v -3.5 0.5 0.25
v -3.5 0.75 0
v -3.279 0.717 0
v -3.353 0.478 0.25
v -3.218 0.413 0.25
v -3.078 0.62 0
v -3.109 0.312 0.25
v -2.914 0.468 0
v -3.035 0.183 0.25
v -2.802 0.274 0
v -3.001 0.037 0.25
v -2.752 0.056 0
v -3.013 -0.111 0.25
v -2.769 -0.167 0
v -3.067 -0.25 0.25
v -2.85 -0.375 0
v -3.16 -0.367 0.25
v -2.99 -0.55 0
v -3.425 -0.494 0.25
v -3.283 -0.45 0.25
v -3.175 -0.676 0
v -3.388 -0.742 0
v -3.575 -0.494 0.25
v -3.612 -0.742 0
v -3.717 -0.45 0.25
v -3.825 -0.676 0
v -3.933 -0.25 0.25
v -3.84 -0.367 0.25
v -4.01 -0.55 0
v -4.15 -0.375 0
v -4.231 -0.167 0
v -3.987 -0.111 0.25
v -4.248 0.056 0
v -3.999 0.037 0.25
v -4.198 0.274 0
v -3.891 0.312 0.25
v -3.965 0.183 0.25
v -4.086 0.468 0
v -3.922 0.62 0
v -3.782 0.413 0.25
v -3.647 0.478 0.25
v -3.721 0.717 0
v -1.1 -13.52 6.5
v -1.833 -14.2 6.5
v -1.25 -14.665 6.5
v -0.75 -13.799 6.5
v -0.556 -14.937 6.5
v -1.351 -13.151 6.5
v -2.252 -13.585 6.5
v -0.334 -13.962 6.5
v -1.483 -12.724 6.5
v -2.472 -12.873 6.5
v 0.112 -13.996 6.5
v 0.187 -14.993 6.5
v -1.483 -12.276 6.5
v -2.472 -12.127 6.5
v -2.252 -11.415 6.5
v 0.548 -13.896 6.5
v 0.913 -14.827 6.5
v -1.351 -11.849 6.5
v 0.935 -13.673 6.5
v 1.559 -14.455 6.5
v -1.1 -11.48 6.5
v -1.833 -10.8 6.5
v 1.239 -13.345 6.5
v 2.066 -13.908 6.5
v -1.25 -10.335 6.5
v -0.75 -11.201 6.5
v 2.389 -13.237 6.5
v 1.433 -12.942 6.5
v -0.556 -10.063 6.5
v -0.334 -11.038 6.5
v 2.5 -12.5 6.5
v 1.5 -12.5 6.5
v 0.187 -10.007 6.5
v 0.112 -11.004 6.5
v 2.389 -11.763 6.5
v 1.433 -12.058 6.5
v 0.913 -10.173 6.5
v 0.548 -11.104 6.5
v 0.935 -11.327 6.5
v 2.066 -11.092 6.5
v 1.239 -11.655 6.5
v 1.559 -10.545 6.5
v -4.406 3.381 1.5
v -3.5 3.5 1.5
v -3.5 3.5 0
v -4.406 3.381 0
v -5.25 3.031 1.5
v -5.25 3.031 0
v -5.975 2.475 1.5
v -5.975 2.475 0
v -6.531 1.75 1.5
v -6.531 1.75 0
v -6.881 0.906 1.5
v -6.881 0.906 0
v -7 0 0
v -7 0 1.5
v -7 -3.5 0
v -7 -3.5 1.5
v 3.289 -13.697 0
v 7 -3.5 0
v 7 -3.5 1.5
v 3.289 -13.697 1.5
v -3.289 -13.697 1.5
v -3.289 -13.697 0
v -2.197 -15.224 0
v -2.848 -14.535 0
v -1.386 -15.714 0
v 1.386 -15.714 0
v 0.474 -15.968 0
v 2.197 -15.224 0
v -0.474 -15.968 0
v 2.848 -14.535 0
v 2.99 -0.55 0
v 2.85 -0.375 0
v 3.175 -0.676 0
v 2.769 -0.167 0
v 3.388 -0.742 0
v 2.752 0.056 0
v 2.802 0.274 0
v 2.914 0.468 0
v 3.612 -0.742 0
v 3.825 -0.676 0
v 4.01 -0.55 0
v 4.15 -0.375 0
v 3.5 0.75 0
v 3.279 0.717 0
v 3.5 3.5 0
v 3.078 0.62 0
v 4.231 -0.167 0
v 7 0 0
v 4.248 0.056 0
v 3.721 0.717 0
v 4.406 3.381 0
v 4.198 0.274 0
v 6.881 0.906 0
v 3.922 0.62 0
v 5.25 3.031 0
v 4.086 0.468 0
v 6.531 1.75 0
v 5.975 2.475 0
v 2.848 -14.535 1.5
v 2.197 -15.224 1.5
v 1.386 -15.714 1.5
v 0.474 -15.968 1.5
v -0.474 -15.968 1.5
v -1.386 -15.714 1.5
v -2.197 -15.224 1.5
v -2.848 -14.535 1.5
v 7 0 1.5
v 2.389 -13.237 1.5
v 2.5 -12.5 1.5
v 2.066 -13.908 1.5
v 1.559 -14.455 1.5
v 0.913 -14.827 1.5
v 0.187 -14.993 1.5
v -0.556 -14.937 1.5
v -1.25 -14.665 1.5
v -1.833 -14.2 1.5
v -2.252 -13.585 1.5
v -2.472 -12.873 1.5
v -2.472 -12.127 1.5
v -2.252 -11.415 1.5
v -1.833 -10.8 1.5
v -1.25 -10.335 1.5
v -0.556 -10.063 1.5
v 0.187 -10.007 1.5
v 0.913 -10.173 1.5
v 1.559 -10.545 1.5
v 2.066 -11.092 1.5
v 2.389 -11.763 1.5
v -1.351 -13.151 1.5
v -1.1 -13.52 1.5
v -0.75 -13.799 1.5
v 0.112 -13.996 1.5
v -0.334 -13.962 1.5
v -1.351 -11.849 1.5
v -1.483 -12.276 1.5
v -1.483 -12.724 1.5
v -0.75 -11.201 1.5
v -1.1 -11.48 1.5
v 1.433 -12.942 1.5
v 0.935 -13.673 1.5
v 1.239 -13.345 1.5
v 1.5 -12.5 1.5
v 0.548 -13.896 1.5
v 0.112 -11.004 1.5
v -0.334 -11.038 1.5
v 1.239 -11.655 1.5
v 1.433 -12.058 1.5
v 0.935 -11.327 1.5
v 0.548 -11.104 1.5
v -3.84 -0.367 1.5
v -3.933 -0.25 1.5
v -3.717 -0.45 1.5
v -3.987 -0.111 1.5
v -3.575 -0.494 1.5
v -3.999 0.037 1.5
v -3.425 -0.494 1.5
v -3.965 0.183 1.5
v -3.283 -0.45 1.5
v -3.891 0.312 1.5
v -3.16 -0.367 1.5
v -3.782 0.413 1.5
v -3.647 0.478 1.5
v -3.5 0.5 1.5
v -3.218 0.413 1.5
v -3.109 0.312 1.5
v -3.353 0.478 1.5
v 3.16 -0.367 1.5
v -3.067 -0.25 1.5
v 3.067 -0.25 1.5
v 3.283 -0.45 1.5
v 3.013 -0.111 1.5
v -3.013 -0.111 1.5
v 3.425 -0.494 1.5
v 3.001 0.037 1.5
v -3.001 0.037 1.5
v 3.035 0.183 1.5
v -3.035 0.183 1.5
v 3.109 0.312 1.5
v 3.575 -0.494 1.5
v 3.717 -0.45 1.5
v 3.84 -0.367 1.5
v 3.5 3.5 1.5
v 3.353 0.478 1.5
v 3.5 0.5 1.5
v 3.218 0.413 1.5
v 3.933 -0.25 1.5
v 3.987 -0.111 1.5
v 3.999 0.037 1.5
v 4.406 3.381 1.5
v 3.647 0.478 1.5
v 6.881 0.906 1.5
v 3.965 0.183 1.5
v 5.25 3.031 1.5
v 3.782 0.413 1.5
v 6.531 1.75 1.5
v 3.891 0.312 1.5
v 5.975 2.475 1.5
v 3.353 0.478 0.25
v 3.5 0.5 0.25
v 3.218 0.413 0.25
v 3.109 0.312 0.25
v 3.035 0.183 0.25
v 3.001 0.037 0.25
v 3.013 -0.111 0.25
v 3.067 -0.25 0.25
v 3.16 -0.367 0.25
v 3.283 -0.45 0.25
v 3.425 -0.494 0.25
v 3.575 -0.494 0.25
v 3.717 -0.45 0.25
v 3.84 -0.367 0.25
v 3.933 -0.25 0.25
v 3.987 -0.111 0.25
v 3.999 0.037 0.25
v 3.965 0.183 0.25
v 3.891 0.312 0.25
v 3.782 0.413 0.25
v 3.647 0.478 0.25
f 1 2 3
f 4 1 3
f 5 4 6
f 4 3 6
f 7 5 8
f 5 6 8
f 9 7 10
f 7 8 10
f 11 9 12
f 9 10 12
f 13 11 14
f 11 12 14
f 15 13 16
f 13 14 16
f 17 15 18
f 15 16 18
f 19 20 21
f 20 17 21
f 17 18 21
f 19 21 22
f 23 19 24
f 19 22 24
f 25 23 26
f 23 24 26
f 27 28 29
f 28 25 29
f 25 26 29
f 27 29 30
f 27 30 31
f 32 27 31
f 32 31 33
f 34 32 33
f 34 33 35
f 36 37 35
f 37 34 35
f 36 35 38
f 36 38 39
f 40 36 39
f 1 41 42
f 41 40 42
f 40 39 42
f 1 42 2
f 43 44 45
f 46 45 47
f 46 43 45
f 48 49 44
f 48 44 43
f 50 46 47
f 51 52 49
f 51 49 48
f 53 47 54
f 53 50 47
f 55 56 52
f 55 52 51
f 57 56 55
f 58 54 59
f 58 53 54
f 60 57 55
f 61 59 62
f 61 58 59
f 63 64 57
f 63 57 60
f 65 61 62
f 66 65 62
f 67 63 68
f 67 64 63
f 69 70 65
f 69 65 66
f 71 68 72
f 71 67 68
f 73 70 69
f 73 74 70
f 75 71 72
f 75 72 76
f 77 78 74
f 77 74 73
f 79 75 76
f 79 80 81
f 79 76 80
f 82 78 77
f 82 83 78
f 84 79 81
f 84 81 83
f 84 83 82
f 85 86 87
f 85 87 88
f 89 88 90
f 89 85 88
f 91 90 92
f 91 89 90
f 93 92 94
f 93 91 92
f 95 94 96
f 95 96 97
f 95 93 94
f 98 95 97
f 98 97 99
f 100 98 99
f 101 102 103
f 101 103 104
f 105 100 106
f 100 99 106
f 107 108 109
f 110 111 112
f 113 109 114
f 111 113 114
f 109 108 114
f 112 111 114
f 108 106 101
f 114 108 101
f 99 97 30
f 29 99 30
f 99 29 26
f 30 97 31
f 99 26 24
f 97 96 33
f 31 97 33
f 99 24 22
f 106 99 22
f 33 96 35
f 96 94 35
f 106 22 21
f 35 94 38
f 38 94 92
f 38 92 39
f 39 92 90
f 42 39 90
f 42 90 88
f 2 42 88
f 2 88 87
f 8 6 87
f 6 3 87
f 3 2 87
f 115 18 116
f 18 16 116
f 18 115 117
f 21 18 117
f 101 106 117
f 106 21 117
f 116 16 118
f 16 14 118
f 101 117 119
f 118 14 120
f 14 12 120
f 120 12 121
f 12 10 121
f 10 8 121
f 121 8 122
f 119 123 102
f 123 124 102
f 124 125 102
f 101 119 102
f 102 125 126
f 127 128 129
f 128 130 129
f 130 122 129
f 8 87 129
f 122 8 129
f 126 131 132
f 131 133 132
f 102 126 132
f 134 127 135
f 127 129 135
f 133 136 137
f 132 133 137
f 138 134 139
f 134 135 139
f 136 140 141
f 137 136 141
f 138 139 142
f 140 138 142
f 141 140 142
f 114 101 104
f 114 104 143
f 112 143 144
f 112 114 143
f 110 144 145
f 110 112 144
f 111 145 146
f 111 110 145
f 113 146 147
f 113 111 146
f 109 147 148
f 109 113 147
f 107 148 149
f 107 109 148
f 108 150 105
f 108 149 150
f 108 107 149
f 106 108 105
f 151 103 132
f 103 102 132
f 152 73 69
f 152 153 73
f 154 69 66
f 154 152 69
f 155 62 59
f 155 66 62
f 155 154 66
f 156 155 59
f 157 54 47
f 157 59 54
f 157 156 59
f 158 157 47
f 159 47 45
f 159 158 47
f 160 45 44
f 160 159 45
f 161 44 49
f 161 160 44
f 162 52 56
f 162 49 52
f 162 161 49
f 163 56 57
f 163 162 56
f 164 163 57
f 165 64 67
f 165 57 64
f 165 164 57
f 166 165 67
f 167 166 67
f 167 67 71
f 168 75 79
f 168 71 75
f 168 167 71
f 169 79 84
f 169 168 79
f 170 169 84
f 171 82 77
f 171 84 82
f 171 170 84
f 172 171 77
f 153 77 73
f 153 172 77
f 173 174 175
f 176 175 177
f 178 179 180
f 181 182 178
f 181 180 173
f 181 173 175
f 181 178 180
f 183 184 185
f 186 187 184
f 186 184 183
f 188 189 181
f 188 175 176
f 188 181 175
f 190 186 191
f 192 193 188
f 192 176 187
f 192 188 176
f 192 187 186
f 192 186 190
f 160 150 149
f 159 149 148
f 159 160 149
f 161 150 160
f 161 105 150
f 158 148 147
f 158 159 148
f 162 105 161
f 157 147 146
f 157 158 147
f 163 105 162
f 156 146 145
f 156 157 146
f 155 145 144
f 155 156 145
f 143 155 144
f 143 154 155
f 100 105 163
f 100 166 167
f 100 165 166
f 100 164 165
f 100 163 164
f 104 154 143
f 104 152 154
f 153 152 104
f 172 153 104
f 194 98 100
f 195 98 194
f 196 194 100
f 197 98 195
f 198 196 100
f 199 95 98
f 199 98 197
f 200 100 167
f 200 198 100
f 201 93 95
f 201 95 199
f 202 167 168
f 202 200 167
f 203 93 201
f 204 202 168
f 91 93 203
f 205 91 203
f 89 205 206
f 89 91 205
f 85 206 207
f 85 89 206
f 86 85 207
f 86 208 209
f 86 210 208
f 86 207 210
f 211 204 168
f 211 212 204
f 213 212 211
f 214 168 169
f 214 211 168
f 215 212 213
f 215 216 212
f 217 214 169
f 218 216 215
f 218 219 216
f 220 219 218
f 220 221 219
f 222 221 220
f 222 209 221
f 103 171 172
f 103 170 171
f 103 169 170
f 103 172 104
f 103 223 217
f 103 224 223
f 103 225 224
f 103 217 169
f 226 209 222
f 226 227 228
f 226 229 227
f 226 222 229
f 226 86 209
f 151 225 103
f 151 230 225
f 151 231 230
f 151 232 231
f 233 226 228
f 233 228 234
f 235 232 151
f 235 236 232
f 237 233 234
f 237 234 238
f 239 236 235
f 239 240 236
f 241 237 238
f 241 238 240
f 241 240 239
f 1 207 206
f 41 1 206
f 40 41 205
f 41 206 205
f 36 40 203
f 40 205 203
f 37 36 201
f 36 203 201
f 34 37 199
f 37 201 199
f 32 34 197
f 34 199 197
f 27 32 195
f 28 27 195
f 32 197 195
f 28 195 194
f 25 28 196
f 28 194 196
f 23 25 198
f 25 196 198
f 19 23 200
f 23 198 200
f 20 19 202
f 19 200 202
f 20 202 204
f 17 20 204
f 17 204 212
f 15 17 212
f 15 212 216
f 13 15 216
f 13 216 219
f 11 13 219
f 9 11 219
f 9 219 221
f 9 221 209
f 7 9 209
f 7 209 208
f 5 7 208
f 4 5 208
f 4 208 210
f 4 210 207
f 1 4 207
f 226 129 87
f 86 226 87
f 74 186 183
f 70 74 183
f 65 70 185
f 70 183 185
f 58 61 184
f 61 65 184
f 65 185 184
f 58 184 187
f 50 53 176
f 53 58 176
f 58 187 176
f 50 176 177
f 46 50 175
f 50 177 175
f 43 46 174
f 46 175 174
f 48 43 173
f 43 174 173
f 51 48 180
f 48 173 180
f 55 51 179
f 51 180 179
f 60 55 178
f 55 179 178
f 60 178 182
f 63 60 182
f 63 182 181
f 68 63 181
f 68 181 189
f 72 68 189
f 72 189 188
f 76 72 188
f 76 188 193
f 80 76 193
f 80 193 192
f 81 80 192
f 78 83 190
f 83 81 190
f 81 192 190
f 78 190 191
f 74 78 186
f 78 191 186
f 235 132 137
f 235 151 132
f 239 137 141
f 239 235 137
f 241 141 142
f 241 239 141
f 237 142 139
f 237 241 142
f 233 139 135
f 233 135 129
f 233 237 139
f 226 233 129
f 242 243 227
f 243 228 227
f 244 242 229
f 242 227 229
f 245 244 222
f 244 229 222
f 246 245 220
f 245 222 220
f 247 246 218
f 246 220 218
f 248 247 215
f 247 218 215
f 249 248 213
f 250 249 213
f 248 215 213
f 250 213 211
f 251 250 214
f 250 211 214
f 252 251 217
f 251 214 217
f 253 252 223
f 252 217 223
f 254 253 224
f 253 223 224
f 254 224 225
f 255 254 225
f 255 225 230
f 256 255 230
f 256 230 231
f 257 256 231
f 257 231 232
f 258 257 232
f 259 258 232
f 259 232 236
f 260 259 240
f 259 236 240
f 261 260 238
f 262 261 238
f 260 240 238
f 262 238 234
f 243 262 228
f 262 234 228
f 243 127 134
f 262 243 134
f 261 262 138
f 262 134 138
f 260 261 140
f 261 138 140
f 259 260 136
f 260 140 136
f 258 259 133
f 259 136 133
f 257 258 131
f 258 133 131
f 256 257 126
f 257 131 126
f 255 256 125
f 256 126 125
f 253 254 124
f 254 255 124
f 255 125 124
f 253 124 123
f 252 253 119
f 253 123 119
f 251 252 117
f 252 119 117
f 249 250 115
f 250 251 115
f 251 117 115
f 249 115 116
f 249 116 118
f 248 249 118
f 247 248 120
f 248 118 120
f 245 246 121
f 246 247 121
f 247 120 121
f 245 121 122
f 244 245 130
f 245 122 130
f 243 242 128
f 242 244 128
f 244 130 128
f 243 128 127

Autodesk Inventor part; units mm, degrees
ref_plane "YZ Plane" through (0, 0, 0) normal (1, 0, 0) x (0, 1, 0)
ref_plane "XZ Plane" through (0, 0, 0) normal (0, 1, 0) x (-1, 0, 0)
ref_plane "XY Plane" through (0, 0, 0) normal (0, 0, 1) x (1, 0, 0)
sketch "Эскиз1" plane through (0, 0, 0) normal (0, 0, 1) x (1, 0, 0)
  line L0 (-7, -3.5) -> (7, -3.5) construction
  line L1 (7, -3.5) -> (7, 3.5)
  line L2 (7, 3.5) -> (-7, 3.5)
  line L3 (-7, 3.5) -> (-7, -3.5)
  line L4 (-7, -3.5) -> (7, 3.5) construction
  line L5 (7, -3.5) -> (-7, 3.5) construction
  line L6 (0, -3.5) -> (0, -12.5) construction
  line L7 (-7, -3.5) -> (-3.289, -13.697)
  line L8 (7, -3.5) -> (3.289, -13.697)
  arc A0 (-3.289, -13.697) -> (3.289, -13.697) centre (0, -12.5) ccw
  point P0 (0, 0)
  point P1 (0, 0)
  point P2 (0, 0)
  point P3 (0, 0)
  dimension "d0" = 14
  dimension "d1" = 7
  dimension "d4" = 9
  dimension "d5" = 3.5
extrude "Выдавливание1" add sketch "Эскиз1" along normal blind 1.5
sketch "Эскиз2" plane through (0, 0, 1.5) normal (0, 0, 1) x (1, 0, 0)
  arc A0 (-3.289, -13.697) -> (3.289, -13.697) centre (0, -12.5) ccw construction
  circle A1 centre (0, -12.5) radius 2.5
  circle A2 centre (0, -12.5) radius 1.5
  point P0 (0, 0)
  dimension "d8" = 5
  dimension "d39" = 1
extrude "Выдавливание11" add sketch "Эскиз2" along normal blind 5
fillet "Сопряжение1" radius 3.5 2 edges at (7, 3.5, 0.75) (-7, 3.5, 0.75)
sketch "Эскиз5" plane through (0, 0, 0) normal (0, 0, 1) x (1, 0, 0)
  circle A0 centre (0, -12.5) radius 1.25 construction
  line L0 (0, -3.5) -> (0, 3.5) construction
  circle A1 centre (3.5, 0) radius 0.5
  line L1 (3.5, 0) -> (3.5, 3.5) construction
  line L2 (3.5, 0) -> (0, 0) construction
  line L3 (7, 3.5) -> (-7, 3.5) construction
  circle A2 centre (-3.5, 0) radius 0.5
  point P0 (7, -3.5)
  dimension "d34" = 1
  dimension "d35" = 3.5
hole "Отверстие1" at (-3.5, 0, 0) at (3.5, 0, 0) direction (0, 0, 1) diameter 1 end through all countersink diameter 1.5 countersink angle 90
properties part number "переходник2"
